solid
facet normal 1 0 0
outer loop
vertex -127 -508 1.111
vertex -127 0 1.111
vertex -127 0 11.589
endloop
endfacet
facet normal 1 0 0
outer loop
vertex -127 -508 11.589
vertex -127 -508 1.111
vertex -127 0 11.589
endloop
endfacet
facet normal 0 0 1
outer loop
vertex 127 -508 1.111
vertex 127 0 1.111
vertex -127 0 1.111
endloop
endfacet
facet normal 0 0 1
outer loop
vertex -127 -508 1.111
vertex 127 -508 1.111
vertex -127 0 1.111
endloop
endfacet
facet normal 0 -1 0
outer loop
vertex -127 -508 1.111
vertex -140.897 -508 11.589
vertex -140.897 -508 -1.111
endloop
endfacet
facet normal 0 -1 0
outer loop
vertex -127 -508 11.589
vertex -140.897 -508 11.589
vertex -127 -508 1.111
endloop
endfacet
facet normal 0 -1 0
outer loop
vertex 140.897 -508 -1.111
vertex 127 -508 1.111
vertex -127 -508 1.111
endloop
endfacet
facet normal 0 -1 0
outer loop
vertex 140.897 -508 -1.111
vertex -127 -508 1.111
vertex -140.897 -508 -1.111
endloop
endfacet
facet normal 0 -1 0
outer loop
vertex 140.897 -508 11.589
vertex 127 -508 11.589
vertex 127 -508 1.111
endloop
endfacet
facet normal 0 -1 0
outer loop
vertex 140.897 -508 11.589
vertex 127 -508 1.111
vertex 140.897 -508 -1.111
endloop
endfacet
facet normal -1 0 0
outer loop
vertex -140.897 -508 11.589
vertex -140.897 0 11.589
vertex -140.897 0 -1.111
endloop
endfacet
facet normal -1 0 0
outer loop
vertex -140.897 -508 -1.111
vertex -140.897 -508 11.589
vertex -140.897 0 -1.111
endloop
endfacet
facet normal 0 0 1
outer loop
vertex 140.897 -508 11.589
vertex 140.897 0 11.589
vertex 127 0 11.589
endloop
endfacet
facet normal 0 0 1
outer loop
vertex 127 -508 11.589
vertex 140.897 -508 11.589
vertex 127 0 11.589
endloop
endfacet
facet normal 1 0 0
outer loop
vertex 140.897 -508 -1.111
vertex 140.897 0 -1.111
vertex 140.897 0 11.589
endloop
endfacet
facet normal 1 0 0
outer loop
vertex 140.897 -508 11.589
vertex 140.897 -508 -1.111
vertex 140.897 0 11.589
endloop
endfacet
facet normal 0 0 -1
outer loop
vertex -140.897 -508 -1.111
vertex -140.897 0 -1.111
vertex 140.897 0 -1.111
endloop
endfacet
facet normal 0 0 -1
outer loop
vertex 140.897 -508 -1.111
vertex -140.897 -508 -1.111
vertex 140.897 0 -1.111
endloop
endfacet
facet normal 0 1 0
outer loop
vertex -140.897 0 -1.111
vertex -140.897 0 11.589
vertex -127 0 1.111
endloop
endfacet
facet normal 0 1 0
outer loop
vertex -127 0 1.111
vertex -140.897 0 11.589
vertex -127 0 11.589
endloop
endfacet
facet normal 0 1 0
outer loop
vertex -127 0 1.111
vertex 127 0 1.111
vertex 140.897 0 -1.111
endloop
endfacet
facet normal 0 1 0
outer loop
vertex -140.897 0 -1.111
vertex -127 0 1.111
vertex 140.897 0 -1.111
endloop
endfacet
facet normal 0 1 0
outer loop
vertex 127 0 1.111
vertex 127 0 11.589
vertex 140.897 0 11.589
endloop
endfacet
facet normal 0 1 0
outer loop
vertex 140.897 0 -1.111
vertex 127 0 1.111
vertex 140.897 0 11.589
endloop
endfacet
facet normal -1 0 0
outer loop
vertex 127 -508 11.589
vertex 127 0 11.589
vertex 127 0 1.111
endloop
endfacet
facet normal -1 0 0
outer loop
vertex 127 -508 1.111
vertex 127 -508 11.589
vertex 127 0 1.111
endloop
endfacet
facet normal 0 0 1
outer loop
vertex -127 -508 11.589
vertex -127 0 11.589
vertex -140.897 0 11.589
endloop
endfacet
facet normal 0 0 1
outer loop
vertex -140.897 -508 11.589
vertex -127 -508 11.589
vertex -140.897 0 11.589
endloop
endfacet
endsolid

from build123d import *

# Parameters (mm, degrees)
F0_W     = 127
F0_H     = 2.221532
F1_DEPTH = 508


with BuildPart() as f1:
    # F0 (on Front) → F1 (new body)
    with BuildSketch(Plane.XZ):
        with Locations((63.5, 0)):
            Rectangle(F0_W, F0_H)
        Polygon((127, 1.110766), (127, -1.110766), (140.89732, -1.110766), (140.89732, 11.589234), (127, 11.589234), align=None)
        with Locations((-63.5, 0)):
            Rectangle(F0_W, F0_H)
        Polygon((-140.89732, -1.110766), (-127, -1.110766), (-127, 1.110766), (-127, 11.589234), (-140.89732, 11.589234), align=None)
    extrude(amount=F1_DEPTH)


solid = f1.part
